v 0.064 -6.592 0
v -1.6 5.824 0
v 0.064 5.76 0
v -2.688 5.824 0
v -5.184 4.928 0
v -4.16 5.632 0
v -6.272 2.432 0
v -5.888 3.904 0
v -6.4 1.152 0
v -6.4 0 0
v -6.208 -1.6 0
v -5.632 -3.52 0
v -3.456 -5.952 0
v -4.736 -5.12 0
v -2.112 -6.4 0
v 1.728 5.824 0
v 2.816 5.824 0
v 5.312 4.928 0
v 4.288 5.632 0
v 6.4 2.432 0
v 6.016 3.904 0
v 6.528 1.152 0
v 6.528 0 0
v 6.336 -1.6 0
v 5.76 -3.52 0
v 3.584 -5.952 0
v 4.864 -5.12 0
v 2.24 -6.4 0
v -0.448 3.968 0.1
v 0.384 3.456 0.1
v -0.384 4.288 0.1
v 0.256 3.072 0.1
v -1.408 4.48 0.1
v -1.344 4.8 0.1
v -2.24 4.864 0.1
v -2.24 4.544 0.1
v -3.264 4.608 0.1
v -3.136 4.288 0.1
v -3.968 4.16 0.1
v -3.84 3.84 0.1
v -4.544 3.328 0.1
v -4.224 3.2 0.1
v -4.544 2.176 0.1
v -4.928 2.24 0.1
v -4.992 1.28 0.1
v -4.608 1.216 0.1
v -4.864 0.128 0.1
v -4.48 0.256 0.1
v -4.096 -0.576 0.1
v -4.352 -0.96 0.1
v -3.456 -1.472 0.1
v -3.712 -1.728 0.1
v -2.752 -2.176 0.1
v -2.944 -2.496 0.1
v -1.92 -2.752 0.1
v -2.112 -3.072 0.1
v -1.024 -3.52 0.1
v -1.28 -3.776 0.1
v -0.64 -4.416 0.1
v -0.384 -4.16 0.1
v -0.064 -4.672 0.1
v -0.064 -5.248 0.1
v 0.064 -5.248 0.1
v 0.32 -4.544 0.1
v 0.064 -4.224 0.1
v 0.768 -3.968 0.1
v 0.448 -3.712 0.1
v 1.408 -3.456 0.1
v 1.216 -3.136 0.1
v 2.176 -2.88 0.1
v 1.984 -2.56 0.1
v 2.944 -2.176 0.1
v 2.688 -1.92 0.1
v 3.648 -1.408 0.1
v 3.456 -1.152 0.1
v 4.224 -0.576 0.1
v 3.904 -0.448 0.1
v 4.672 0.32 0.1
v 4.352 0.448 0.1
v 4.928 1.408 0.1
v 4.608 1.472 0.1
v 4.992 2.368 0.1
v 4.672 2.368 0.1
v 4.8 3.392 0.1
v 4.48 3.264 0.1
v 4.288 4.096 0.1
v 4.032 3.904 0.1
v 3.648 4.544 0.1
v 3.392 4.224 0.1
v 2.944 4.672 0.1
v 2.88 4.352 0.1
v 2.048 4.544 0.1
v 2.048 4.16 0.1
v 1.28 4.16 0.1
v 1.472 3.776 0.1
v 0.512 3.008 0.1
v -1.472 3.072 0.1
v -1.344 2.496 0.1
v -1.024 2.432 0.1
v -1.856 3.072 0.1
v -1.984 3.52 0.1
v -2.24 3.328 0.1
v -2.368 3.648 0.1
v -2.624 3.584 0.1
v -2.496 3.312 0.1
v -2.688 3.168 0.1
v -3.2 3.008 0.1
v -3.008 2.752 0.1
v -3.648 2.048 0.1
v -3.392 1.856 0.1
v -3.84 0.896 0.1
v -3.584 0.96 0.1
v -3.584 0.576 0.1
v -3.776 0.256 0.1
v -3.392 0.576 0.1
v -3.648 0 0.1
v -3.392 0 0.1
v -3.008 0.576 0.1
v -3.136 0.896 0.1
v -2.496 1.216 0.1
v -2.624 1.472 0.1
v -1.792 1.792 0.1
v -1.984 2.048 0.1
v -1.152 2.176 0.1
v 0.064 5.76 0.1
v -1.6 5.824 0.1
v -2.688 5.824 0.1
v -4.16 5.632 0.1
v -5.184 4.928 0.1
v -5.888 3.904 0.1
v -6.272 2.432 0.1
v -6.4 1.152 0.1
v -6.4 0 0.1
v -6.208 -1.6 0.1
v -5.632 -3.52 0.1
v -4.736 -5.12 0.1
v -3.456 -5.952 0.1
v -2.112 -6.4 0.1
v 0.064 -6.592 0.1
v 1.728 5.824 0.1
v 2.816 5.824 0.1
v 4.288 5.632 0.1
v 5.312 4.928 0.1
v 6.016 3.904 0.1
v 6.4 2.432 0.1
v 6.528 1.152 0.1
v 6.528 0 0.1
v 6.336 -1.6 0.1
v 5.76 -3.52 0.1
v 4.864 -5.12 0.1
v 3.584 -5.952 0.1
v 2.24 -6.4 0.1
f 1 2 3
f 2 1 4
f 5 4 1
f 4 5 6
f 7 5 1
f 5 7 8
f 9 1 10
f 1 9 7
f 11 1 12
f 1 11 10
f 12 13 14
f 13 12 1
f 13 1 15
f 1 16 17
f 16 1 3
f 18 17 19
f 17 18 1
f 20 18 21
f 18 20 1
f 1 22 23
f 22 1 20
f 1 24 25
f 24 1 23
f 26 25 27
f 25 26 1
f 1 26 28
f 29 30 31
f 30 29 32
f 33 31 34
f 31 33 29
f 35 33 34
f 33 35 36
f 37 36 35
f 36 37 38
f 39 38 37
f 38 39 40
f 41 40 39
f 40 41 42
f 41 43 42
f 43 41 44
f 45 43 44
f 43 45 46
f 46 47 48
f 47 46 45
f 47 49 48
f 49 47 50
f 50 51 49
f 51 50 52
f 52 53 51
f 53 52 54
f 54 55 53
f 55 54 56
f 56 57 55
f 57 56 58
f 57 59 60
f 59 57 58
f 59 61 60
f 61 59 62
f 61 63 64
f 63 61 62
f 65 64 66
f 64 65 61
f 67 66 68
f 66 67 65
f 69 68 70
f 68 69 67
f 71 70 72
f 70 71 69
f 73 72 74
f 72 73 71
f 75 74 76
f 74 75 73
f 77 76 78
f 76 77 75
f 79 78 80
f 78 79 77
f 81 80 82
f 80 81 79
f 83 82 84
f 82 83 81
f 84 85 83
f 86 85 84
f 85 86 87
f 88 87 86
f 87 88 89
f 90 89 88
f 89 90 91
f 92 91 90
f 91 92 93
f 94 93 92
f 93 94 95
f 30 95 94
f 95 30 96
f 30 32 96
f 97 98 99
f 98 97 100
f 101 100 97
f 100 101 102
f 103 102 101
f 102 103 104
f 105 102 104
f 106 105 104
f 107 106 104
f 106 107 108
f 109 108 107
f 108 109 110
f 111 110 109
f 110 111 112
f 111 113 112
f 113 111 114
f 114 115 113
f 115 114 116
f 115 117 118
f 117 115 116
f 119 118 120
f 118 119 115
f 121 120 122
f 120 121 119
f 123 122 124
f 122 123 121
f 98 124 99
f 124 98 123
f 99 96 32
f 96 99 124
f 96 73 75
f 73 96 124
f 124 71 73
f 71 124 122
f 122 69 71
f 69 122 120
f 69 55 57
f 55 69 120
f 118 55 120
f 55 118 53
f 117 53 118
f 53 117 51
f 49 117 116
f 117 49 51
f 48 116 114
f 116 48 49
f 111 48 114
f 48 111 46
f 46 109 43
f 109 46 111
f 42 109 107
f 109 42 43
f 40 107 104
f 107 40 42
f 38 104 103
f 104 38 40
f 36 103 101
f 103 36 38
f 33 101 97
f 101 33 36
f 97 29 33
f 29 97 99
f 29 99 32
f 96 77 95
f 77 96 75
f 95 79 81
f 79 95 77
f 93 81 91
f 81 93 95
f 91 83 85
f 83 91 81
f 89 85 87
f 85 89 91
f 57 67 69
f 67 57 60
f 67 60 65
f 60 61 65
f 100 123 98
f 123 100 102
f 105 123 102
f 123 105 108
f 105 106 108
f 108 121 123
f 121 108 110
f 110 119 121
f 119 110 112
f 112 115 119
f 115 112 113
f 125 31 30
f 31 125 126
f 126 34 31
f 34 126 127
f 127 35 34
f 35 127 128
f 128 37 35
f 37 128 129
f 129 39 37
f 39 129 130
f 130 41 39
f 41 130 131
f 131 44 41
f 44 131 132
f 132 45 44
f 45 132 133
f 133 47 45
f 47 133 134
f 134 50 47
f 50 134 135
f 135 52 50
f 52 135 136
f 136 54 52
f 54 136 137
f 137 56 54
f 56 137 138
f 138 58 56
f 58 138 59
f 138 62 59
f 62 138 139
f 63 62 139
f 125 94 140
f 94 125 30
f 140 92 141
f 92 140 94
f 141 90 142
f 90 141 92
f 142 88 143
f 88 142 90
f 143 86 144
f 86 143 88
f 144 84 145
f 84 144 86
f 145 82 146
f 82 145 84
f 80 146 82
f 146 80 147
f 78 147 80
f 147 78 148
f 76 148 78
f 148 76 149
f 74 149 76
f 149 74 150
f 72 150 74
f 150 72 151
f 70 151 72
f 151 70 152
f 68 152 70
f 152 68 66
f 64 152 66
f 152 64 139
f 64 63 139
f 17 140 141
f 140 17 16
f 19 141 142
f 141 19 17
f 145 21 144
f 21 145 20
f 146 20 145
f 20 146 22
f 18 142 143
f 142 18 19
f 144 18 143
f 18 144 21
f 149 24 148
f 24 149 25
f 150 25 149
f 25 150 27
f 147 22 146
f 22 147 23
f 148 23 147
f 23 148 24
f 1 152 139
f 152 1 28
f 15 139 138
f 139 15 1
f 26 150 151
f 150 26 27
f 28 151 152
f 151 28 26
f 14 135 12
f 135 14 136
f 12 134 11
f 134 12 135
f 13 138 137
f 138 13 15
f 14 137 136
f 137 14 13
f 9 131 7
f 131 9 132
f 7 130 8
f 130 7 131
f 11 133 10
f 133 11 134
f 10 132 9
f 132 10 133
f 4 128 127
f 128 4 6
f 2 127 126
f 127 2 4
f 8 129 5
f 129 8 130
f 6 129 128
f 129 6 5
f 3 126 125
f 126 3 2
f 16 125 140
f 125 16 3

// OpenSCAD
use <../lib.scad>
function ldraw_lib__194065e() = [
// 0 Sticker  2 x  1.9 with Red Heart
// 0 Name: 194065e.dat
// 0 Author: Philippe Hurbain [Philo]
// 0 !LDRAW_ORG Part UPDATE 2018-01
// 0 !LICENSE Licensed under CC BY 2.0 and CC BY 4.0 : see CAreadme.txt
// 
// 0 BFC CERTIFY CCW
  [0,"BFC","CERTIFY"],
  [0,"BFC","CCW"],
// 
// 0 !KEYWORDS Fabuland, Set 3678
// 
// 0 !HISTORY 2018-01-30 [PTadmin] Official Update 2018-01
// 
// 
// 4 16 -4 0 14.56 .16 0 14.4 .16 0 -16.48 -6.72 0 14.56
  [4,16,-4,0,14.56,.16,0,14.4,.16,0,-16.48,-6.72,0,14.56],
// 4 16 -10.4 0 14.08 -6.72 0 14.56 .16 0 -16.48 -12.96 0 12.32
  [4,16,-10.4,0,14.08,-6.72,0,14.56,.16,0,-16.48,-12.96,0,12.32],
// 4 16 -14.72 0 9.76 -12.96 0 12.32 .16 0 -16.48 -15.68 0 6.08
  [4,16,-14.72,0,9.76,-12.96,0,12.32,.16,0,-16.48,-15.68,0,6.08],
// 4 16 -16 0 2.88 -15.68 0 6.08 .16 0 -16.48 -16 0 0
  [4,16,-16,0,2.88,-15.68,0,6.08,.16,0,-16.48,-16,0,0],
// 4 16 -15.52 0 -4 -16 0 0 .16 0 -16.48 -14.08 0 -8.8
  [4,16,-15.52,0,-4,-16,0,0,.16,0,-16.48,-14.08,0,-8.8],
// 4 16 -11.84 0 -12.8 -14.08 0 -8.8 .16 0 -16.48 -8.64 0 -14.88
  [4,16,-11.84,0,-12.8,-14.08,0,-8.8,.16,0,-16.48,-8.64,0,-14.88],
// 3 16 -8.64 0 -14.88 .16 0 -16.48 -5.28 0 -16
  [3,16,-8.64,0,-14.88,.16,0,-16.48,-5.28,0,-16],
// 4 16 .16 0 -16.48 .16 0 14.4 4.32 0 14.56 7.04 0 14.56
  [4,16,.16,0,-16.48,.16,0,14.4,4.32,0,14.56,7.04,0,14.56],
// 4 16 .16 0 -16.48 7.04 0 14.56 10.72 0 14.08 13.28 0 12.32
  [4,16,.16,0,-16.48,7.04,0,14.56,10.72,0,14.08,13.28,0,12.32],
// 4 16 .16 0 -16.48 13.28 0 12.32 15.04 0 9.76 16 0 6.08
  [4,16,.16,0,-16.48,13.28,0,12.32,15.04,0,9.76,16,0,6.08],
// 4 16 .16 0 -16.48 16 0 6.08 16.32 0 2.88 16.32 0 0
  [4,16,.16,0,-16.48,16,0,6.08,16.32,0,2.88,16.32,0,0],
// 4 16 .16 0 -16.48 16.32 0 0 15.84 0 -4 14.4 0 -8.8
  [4,16,.16,0,-16.48,16.32,0,0,15.84,0,-4,14.4,0,-8.8],
// 4 16 .16 0 -16.48 14.4 0 -8.8 12.16 0 -12.8 8.96 0 -14.88
  [4,16,.16,0,-16.48,14.4,0,-8.8,12.16,0,-12.8,8.96,0,-14.88],
// 3 16 .16 0 -16.48 8.96 0 -14.88 5.6 0 -16
  [3,16,.16,0,-16.48,8.96,0,-14.88,5.6,0,-16],
// 4 0 -1.12 -.25 9.92 .64 -.25 7.68 .96 -.25 8.64 -.96 -.25 10.72
  [4,0,-1.12,-.25,9.92,.64,-.25,7.68,.96,-.25,8.64,-.96,-.25,10.72],
// 4 0 -1.12 -.25 9.92 -.96 -.25 10.72 -3.36 -.25 12 -3.52 -.25 11.2
  [4,0,-1.12,-.25,9.92,-.96,-.25,10.72,-3.36,-.25,12,-3.52,-.25,11.2],
// 4 0 -3.52 -.25 11.2 -3.36 -.25 12 -5.6 -.25 12.16 -5.6 -.25 11.36
  [4,0,-3.52,-.25,11.2,-3.36,-.25,12,-5.6,-.25,12.16,-5.6,-.25,11.36],
// 4 0 -8.16 -.25 11.52 -7.84 -.25 10.72 -5.6 -.25 11.36 -5.6 -.25 12.16
  [4,0,-8.16,-.25,11.52,-7.84,-.25,10.72,-5.6,-.25,11.36,-5.6,-.25,12.16],
// 4 0 -9.6 -.25 9.6 -7.84 -.25 10.72 -8.16 -.25 11.52 -9.92 -.25 10.4
  [4,0,-9.6,-.25,9.6,-7.84,-.25,10.72,-8.16,-.25,11.52,-9.92,-.25,10.4],
// 4 0 -9.6 -.25 9.6 -9.92 -.25 10.4 -11.36 -.25 8.32 -10.56 -.25 8
  [4,0,-9.6,-.25,9.6,-9.92,-.25,10.4,-11.36,-.25,8.32,-10.56,-.25,8],
// 4 0 -11.36 -.25 8.32 -12.32 -.25 5.6 -11.36 -.25 5.44 -10.56 -.25 8
  [4,0,-11.36,-.25,8.32,-12.32,-.25,5.6,-11.36,-.25,5.44,-10.56,-.25,8],
// 4 0 -11.52 -.25 3.04 -11.36 -.25 5.44 -12.32 -.25 5.6 -12.48 -.25 3.2
  [4,0,-11.52,-.25,3.04,-11.36,-.25,5.44,-12.32,-.25,5.6,-12.48,-.25,3.2],
// 4 0 -11.52 -.25 3.04 -12.48 -.25 3.2 -12.16 -.25 .32 -11.2 -.25 .64
  [4,0,-11.52,-.25,3.04,-12.48,-.25,3.2,-12.16,-.25,.32,-11.2,-.25,.64],
// 4 0 -11.2 -.25 .64 -12.16 -.25 .32 -10.88 -.25 -2.4 -10.24 -.25 -1.44
  [4,0,-11.2,-.25,.64,-12.16,-.25,.32,-10.88,-.25,-2.4,-10.24,-.25,-1.44],
// 4 0 -10.24 -.25 -1.44 -10.88 -.25 -2.4 -9.28 -.25 -4.32 -8.64 -.25 -3.68
  [4,0,-10.24,-.25,-1.44,-10.88,-.25,-2.4,-9.28,-.25,-4.32,-8.64,-.25,-3.68],
// 4 0 -8.64 -.25 -3.68 -9.28 -.25 -4.32 -7.36 -.25 -6.24 -6.88 -.25 -5.44
  [4,0,-8.64,-.25,-3.68,-9.28,-.25,-4.32,-7.36,-.25,-6.24,-6.88,-.25,-5.44],
// 4 0 -6.88 -.25 -5.44 -7.36 -.25 -6.24 -5.28 -.25 -7.68 -4.8 -.25 -6.88
  [4,0,-6.88,-.25,-5.44,-7.36,-.25,-6.24,-5.28,-.25,-7.68,-4.8,-.25,-6.88],
// 4 0 -4.8 -.25 -6.88 -5.28 -.25 -7.68 -3.2 -.25 -9.44 -2.56 -.25 -8.8
  [4,0,-4.8,-.25,-6.88,-5.28,-.25,-7.68,-3.2,-.25,-9.44,-2.56,-.25,-8.8],
// 4 0 -2.56 -.25 -8.8 -3.2 -.25 -9.44 -1.6 -.25 -11.04 -.96 -.25 -10.4
  [4,0,-2.56,-.25,-8.8,-3.2,-.25,-9.44,-1.6,-.25,-11.04,-.96,-.25,-10.4],
// 4 0 -.96 -.25 -10.4 -1.6 -.25 -11.04 -.16 -.25 -13.12 -.16 -.25 -11.68
  [4,0,-.96,-.25,-10.4,-1.6,-.25,-11.04,-.16,-.25,-13.12,-.16,-.25,-11.68],
// 4 0 -.16 -.25 -11.68 -.16 -.25 -13.12 .16 -.25 -13.12 .8 -.25 -11.36
  [4,0,-.16,-.25,-11.68,-.16,-.25,-13.12,.16,-.25,-13.12,.8,-.25,-11.36],
// 4 0 .16 -.25 -10.56 -.16 -.25 -11.68 .8 -.25 -11.36 1.92 -.25 -9.92
  [4,0,.16,-.25,-10.56,-.16,-.25,-11.68,.8,-.25,-11.36,1.92,-.25,-9.92],
// 4 0 1.12 -.25 -9.28 .16 -.25 -10.56 1.92 -.25 -9.92 3.52 -.25 -8.64
  [4,0,1.12,-.25,-9.28,.16,-.25,-10.56,1.92,-.25,-9.92,3.52,-.25,-8.64],
// 4 0 3.04 -.25 -7.84 1.12 -.25 -9.28 3.52 -.25 -8.64 5.44 -.25 -7.2
  [4,0,3.04,-.25,-7.84,1.12,-.25,-9.28,3.52,-.25,-8.64,5.44,-.25,-7.2],
// 4 0 4.96 -.25 -6.4 3.04 -.25 -7.84 5.44 -.25 -7.2 7.36 -.25 -5.44
  [4,0,4.96,-.25,-6.4,3.04,-.25,-7.84,5.44,-.25,-7.2,7.36,-.25,-5.44],
// 4 0 6.72 -.25 -4.8 4.96 -.25 -6.4 7.36 -.25 -5.44 9.12 -.25 -3.52
  [4,0,6.72,-.25,-4.8,4.96,-.25,-6.4,7.36,-.25,-5.44,9.12,-.25,-3.52],
// 4 0 8.64 -.25 -2.88 6.72 -.25 -4.8 9.12 -.25 -3.52 10.56 -.25 -1.44
  [4,0,8.64,-.25,-2.88,6.72,-.25,-4.8,9.12,-.25,-3.52,10.56,-.25,-1.44],
// 4 0 9.76 -.25 -1.12 8.64 -.25 -2.88 10.56 -.25 -1.44 11.68 -.25 .8
  [4,0,9.76,-.25,-1.12,8.64,-.25,-2.88,10.56,-.25,-1.44,11.68,-.25,.8],
// 4 0 10.88 -.25 1.12 9.76 -.25 -1.12 11.68 -.25 .8 12.32 -.25 3.52
  [4,0,10.88,-.25,1.12,9.76,-.25,-1.12,11.68,-.25,.8,12.32,-.25,3.52],
// 4 0 11.52 -.25 3.68 10.88 -.25 1.12 12.32 -.25 3.52 12.48 -.25 5.92
  [4,0,11.52,-.25,3.68,10.88,-.25,1.12,12.32,-.25,3.52,12.48,-.25,5.92],
// 4 0 11.68 -.25 5.92 11.52 -.25 3.68 12.48 -.25 5.92 12 -.25 8.48
  [4,0,11.68,-.25,5.92,11.52,-.25,3.68,12.48,-.25,5.92,12,-.25,8.48],
// 3 0 12 -.25 8.48 11.2 -.25 8.16 11.68 -.25 5.92
  [3,0,12,-.25,8.48,11.2,-.25,8.16,11.68,-.25,5.92],
// 4 0 11.2 -.25 8.16 12 -.25 8.48 10.72 -.25 10.24 10.08 -.25 9.76
  [4,0,11.2,-.25,8.16,12,-.25,8.48,10.72,-.25,10.24,10.08,-.25,9.76],
// 4 0 10.08 -.25 9.76 10.72 -.25 10.24 9.12 -.25 11.36 8.48 -.25 10.56
  [4,0,10.08,-.25,9.76,10.72,-.25,10.24,9.12,-.25,11.36,8.48,-.25,10.56],
// 4 0 8.48 -.25 10.56 9.12 -.25 11.36 7.36 -.25 11.68 7.2 -.25 10.88
  [4,0,8.48,-.25,10.56,9.12,-.25,11.36,7.36,-.25,11.68,7.2,-.25,10.88],
// 4 0 7.2 -.25 10.88 7.36 -.25 11.68 5.12 -.25 11.36 5.12 -.25 10.4
  [4,0,7.2,-.25,10.88,7.36,-.25,11.68,5.12,-.25,11.36,5.12,-.25,10.4],
// 4 0 5.12 -.25 10.4 5.12 -.25 11.36 3.2 -.25 10.4 3.68 -.25 9.44
  [4,0,5.12,-.25,10.4,5.12,-.25,11.36,3.2,-.25,10.4,3.68,-.25,9.44],
// 4 0 3.68 -.25 9.44 3.2 -.25 10.4 .96 -.25 8.64 1.28 -.25 7.52
  [4,0,3.68,-.25,9.44,3.2,-.25,10.4,.96,-.25,8.64,1.28,-.25,7.52],
// 3 0 .96 -.25 8.64 .64 -.25 7.68 1.28 -.25 7.52
  [3,0,.96,-.25,8.64,.64,-.25,7.68,1.28,-.25,7.52],
// 4 0 -3.36 -.25 6.24 -2.56 -.25 6.08 -3.68 -.25 7.68 -4.64 -.25 7.68
  [4,0,-3.36,-.25,6.24,-2.56,-.25,6.08,-3.68,-.25,7.68,-4.64,-.25,7.68],
// 4 0 -4.64 -.25 7.68 -3.68 -.25 7.68 -4.96 -.25 8.8 -5.6 -.25 8.32
  [4,0,-4.64,-.25,7.68,-3.68,-.25,7.68,-4.96,-.25,8.8,-5.6,-.25,8.32],
// 4 0 -5.6 -.25 8.32 -4.96 -.25 8.8 -5.92 -.25 9.12 -6.56 -.25 8.96
  [4,0,-5.6,-.25,8.32,-4.96,-.25,8.8,-5.92,-.25,9.12,-6.56,-.25,8.96],
// 3 0 -6.24 -.25 8.28 -5.6 -.25 8.32 -6.56 -.25 8.96
  [3,0,-6.24,-.25,8.28,-5.6,-.25,8.32,-6.56,-.25,8.96],
// 3 0 -6.72 -.25 7.92 -6.24 -.25 8.28 -6.56 -.25 8.96
  [3,0,-6.72,-.25,7.92,-6.24,-.25,8.28,-6.56,-.25,8.96],
// 4 0 -6.72 -.25 7.92 -6.56 -.25 8.96 -8 -.25 7.52 -7.52 -.25 6.88
  [4,0,-6.72,-.25,7.92,-6.56,-.25,8.96,-8,-.25,7.52,-7.52,-.25,6.88],
// 4 0 -7.52 -.25 6.88 -8 -.25 7.52 -9.12 -.25 5.12 -8.48 -.25 4.64
  [4,0,-7.52,-.25,6.88,-8,-.25,7.52,-9.12,-.25,5.12,-8.48,-.25,4.64],
// 4 0 -8.48 -.25 4.64 -9.12 -.25 5.12 -9.6 -.25 2.24 -8.96 -.25 2.4
  [4,0,-8.48,-.25,4.64,-9.12,-.25,5.12,-9.6,-.25,2.24,-8.96,-.25,2.4],
// 4 0 -8.96 -.25 2.4 -9.6 -.25 2.24 -9.44 -.25 .64 -8.96 -.25 1.44
  [4,0,-8.96,-.25,2.4,-9.6,-.25,2.24,-9.44,-.25,.64,-8.96,-.25,1.44],
// 4 0 -8.96 -.25 1.44 -9.44 -.25 .64 -9.12 -.25 0 -8.48 -.25 1.44
  [4,0,-8.96,-.25,1.44,-9.44,-.25,.64,-9.12,-.25,0,-8.48,-.25,1.44],
// 4 0 -8.48 -.25 1.44 -9.12 -.25 0 -8.48 -.25 0 -7.52 -.25 1.44
  [4,0,-8.48,-.25,1.44,-9.12,-.25,0,-8.48,-.25,0,-7.52,-.25,1.44],
// 4 0 -7.84 -.25 2.24 -8.48 -.25 1.44 -7.52 -.25 1.44 -6.24 -.25 3.04
  [4,0,-7.84,-.25,2.24,-8.48,-.25,1.44,-7.52,-.25,1.44,-6.24,-.25,3.04],
// 4 0 -6.56 -.25 3.68 -7.84 -.25 2.24 -6.24 -.25 3.04 -4.48 -.25 4.48
  [4,0,-6.56,-.25,3.68,-7.84,-.25,2.24,-6.24,-.25,3.04,-4.48,-.25,4.48],
// 4 0 -4.96 -.25 5.12 -6.56 -.25 3.68 -4.48 -.25 4.48 -2.88 -.25 5.44
  [4,0,-4.96,-.25,5.12,-6.56,-.25,3.68,-4.48,-.25,4.48,-2.88,-.25,5.44],
// 4 0 -3.36 -.25 6.24 -4.96 -.25 5.12 -2.88 -.25 5.44 -2.56 -.25 6.08
  [4,0,-3.36,-.25,6.24,-4.96,-.25,5.12,-2.88,-.25,5.44,-2.56,-.25,6.08],
// 4 4 .64 -.25 7.68 -2.56 -.25 6.08 -2.88 -.25 5.44 1.28 -.25 7.52
  [4,4,.64,-.25,7.68,-2.56,-.25,6.08,-2.88,-.25,5.44,1.28,-.25,7.52],
// 4 4 8.64 -.25 -2.88 1.28 -.25 7.52 -2.88 -.25 5.44 6.72 -.25 -4.8
  [4,4,8.64,-.25,-2.88,1.28,-.25,7.52,-2.88,-.25,5.44,6.72,-.25,-4.8],
// 4 4 4.96 -.25 -6.4 6.72 -.25 -4.8 -2.88 -.25 5.44 -4.48 -.25 4.48
  [4,4,4.96,-.25,-6.4,6.72,-.25,-4.8,-2.88,-.25,5.44,-4.48,-.25,4.48],
// 4 4 4.96 -.25 -6.4 -4.48 -.25 4.48 -6.24 -.25 3.04 3.04 -.25 -7.84
  [4,4,4.96,-.25,-6.4,-4.48,-.25,4.48,-6.24,-.25,3.04,3.04,-.25,-7.84],
// 4 4 -2.56 -.25 -8.8 3.04 -.25 -7.84 -6.24 -.25 3.04 -4.8 -.25 -6.88
  [4,4,-2.56,-.25,-8.8,3.04,-.25,-7.84,-6.24,-.25,3.04,-4.8,-.25,-6.88],
// 4 4 -6.88 -.25 -5.44 -4.8 -.25 -6.88 -6.24 -.25 3.04 -7.52 -.25 1.44
  [4,4,-6.88,-.25,-5.44,-4.8,-.25,-6.88,-6.24,-.25,3.04,-7.52,-.25,1.44],
// 4 4 -6.88 -.25 -5.44 -7.52 -.25 1.44 -8.48 -.25 0 -8.64 -.25 -3.68
  [4,4,-6.88,-.25,-5.44,-7.52,-.25,1.44,-8.48,-.25,0,-8.64,-.25,-3.68],
// 4 4 -8.64 -.25 -3.68 -8.48 -.25 0 -9.12 -.25 0 -10.24 -.25 -1.44
  [4,4,-8.64,-.25,-3.68,-8.48,-.25,0,-9.12,-.25,0,-10.24,-.25,-1.44],
// 4 4 -10.24 -.25 -1.44 -9.12 -.25 0 -9.44 -.25 .64 -11.2 -.25 .64
  [4,4,-10.24,-.25,-1.44,-9.12,-.25,0,-9.44,-.25,.64,-11.2,-.25,.64],
// 4 4 -11.2 -.25 .64 -9.44 -.25 .64 -9.6 -.25 2.24 -11.52 -.25 3.04
  [4,4,-11.2,-.25,.64,-9.44,-.25,.64,-9.6,-.25,2.24,-11.52,-.25,3.04],
// 4 4 -11.52 -.25 3.04 -9.6 -.25 2.24 -9.12 -.25 5.12 -11.36 -.25 5.44
  [4,4,-11.52,-.25,3.04,-9.6,-.25,2.24,-9.12,-.25,5.12,-11.36,-.25,5.44],
// 4 4 -11.36 -.25 5.44 -9.12 -.25 5.12 -8 -.25 7.52 -10.56 -.25 8
  [4,4,-11.36,-.25,5.44,-9.12,-.25,5.12,-8,-.25,7.52,-10.56,-.25,8],
// 4 4 -9.6 -.25 9.6 -10.56 -.25 8 -8 -.25 7.52 -6.56 -.25 8.96
  [4,4,-9.6,-.25,9.6,-10.56,-.25,8,-8,-.25,7.52,-6.56,-.25,8.96],
// 4 4 -7.84 -.25 10.72 -9.6 -.25 9.6 -6.56 -.25 8.96 -5.92 -.25 9.12
  [4,4,-7.84,-.25,10.72,-9.6,-.25,9.6,-6.56,-.25,8.96,-5.92,-.25,9.12],
// 4 4 -5.6 -.25 11.36 -7.84 -.25 10.72 -5.92 -.25 9.12 -4.96 -.25 8.8
  [4,4,-5.6,-.25,11.36,-7.84,-.25,10.72,-5.92,-.25,9.12,-4.96,-.25,8.8],
// 4 4 -3.52 -.25 11.2 -5.6 -.25 11.36 -4.96 -.25 8.8 -3.68 -.25 7.68
  [4,4,-3.52,-.25,11.2,-5.6,-.25,11.36,-4.96,-.25,8.8,-3.68,-.25,7.68],
// 4 4 -1.12 -.25 9.92 -3.52 -.25 11.2 -3.68 -.25 7.68 -2.56 -.25 6.08
  [4,4,-1.12,-.25,9.92,-3.52,-.25,11.2,-3.68,-.25,7.68,-2.56,-.25,6.08],
// 3 4 -1.12 -.25 9.92 -2.56 -.25 6.08 .64 -.25 7.68
  [3,4,-1.12,-.25,9.92,-2.56,-.25,6.08,.64,-.25,7.68],
// 4 4 1.28 -.25 7.52 8.64 -.25 -2.88 9.76 -.25 -1.12 3.68 -.25 9.44
  [4,4,1.28,-.25,7.52,8.64,-.25,-2.88,9.76,-.25,-1.12,3.68,-.25,9.44],
// 4 4 3.68 -.25 9.44 9.76 -.25 -1.12 10.88 -.25 1.12 11.52 -.25 3.68
  [4,4,3.68,-.25,9.44,9.76,-.25,-1.12,10.88,-.25,1.12,11.52,-.25,3.68],
// 4 4 5.12 -.25 10.4 3.68 -.25 9.44 11.52 -.25 3.68 7.2 -.25 10.88
  [4,4,5.12,-.25,10.4,3.68,-.25,9.44,11.52,-.25,3.68,7.2,-.25,10.88],
// 4 4 7.2 -.25 10.88 11.52 -.25 3.68 11.68 -.25 5.92 11.2 -.25 8.16
  [4,4,7.2,-.25,10.88,11.52,-.25,3.68,11.68,-.25,5.92,11.2,-.25,8.16],
// 4 4 8.48 -.25 10.56 7.2 -.25 10.88 11.2 -.25 8.16 10.08 -.25 9.76
  [4,4,8.48,-.25,10.56,7.2,-.25,10.88,11.2,-.25,8.16,10.08,-.25,9.76],
// 4 4 1.12 -.25 -9.28 3.04 -.25 -7.84 -2.56 -.25 -8.8 -.96 -.25 -10.4
  [4,4,1.12,-.25,-9.28,3.04,-.25,-7.84,-2.56,-.25,-8.8,-.96,-.25,-10.4],
// 3 4 1.12 -.25 -9.28 -.96 -.25 -10.4 .16 -.25 -10.56
  [3,4,1.12,-.25,-9.28,-.96,-.25,-10.4,.16,-.25,-10.56],
// 3 4 -.96 -.25 -10.4 -.16 -.25 -11.68 .16 -.25 -10.56
  [3,4,-.96,-.25,-10.4,-.16,-.25,-11.68,.16,-.25,-10.56],
// 4 15 -4.96 -.25 5.12 -3.36 -.25 6.24 -4.64 -.25 7.68 -5.6 -.25 8.32
  [4,15,-4.96,-.25,5.12,-3.36,-.25,6.24,-4.64,-.25,7.68,-5.6,-.25,8.32],
// 4 15 -5.6 -.25 8.32 -6.24 -.25 8.28 -7.52 -.25 6.88 -4.96 -.25 5.12
  [4,15,-5.6,-.25,8.32,-6.24,-.25,8.28,-7.52,-.25,6.88,-4.96,-.25,5.12],
// 3 15 -6.24 -.25 8.28 -6.72 -.25 7.92 -7.52 -.25 6.88
  [3,15,-6.24,-.25,8.28,-6.72,-.25,7.92,-7.52,-.25,6.88],
// 4 15 -6.56 -.25 3.68 -4.96 -.25 5.12 -7.52 -.25 6.88 -8.48 -.25 4.64
  [4,15,-6.56,-.25,3.68,-4.96,-.25,5.12,-7.52,-.25,6.88,-8.48,-.25,4.64],
// 4 15 -7.84 -.25 2.24 -6.56 -.25 3.68 -8.48 -.25 4.64 -8.96 -.25 2.4
  [4,15,-7.84,-.25,2.24,-6.56,-.25,3.68,-8.48,-.25,4.64,-8.96,-.25,2.4],
// 4 15 -8.48 -.25 1.44 -7.84 -.25 2.24 -8.96 -.25 2.4 -8.96 -.25 1.44
  [4,15,-8.48,-.25,1.44,-7.84,-.25,2.24,-8.96,-.25,2.4,-8.96,-.25,1.44],
// 4 16 -.96 -.25 10.72 .96 -.25 8.64 .16 -.25 14.4 -4 -.25 14.56
  [4,16,-.96,-.25,10.72,.96,-.25,8.64,.16,-.25,14.4,-4,-.25,14.56],
// 4 16 -3.36 -.25 12 -.96 -.25 10.72 -4 -.25 14.56 -6.72 -.25 14.56
  [4,16,-3.36,-.25,12,-.96,-.25,10.72,-4,-.25,14.56,-6.72,-.25,14.56],
// 4 16 -5.6 -.25 12.16 -3.36 -.25 12 -6.72 -.25 14.56 -10.4 -.25 14.08
  [4,16,-5.6,-.25,12.16,-3.36,-.25,12,-6.72,-.25,14.56,-10.4,-.25,14.08],
// 4 16 -8.16 -.25 11.52 -5.6 -.25 12.16 -10.4 -.25 14.08 -12.96 -.25 12.32
  [4,16,-8.16,-.25,11.52,-5.6,-.25,12.16,-10.4,-.25,14.08,-12.96,-.25,12.32],
// 4 16 -9.92 -.25 10.4 -8.16 -.25 11.52 -12.96 -.25 12.32 -14.72 -.25 9.76
  [4,16,-9.92,-.25,10.4,-8.16,-.25,11.52,-12.96,-.25,12.32,-14.72,-.25,9.76],
// 4 16 -11.36 -.25 8.32 -9.92 -.25 10.4 -14.72 -.25 9.76 -15.68 -.25 6.08
  [4,16,-11.36,-.25,8.32,-9.92,-.25,10.4,-14.72,-.25,9.76,-15.68,-.25,6.08],
// 4 16 -12.32 -.25 5.6 -11.36 -.25 8.32 -15.68 -.25 6.08 -16 -.25 2.88
  [4,16,-12.32,-.25,5.6,-11.36,-.25,8.32,-15.68,-.25,6.08,-16,-.25,2.88],
// 4 16 -12.48 -.25 3.2 -12.32 -.25 5.6 -16 -.25 2.88 -16 -.25 0
  [4,16,-12.48,-.25,3.2,-12.32,-.25,5.6,-16,-.25,2.88,-16,-.25,0],
// 4 16 -12.16 -.25 .32 -12.48 -.25 3.2 -16 -.25 0 -15.52 -.25 -4
  [4,16,-12.16,-.25,.32,-12.48,-.25,3.2,-16,-.25,0,-15.52,-.25,-4],
// 4 16 -10.88 -.25 -2.4 -12.16 -.25 .32 -15.52 -.25 -4 -14.08 -.25 -8.8
  [4,16,-10.88,-.25,-2.4,-12.16,-.25,.32,-15.52,-.25,-4,-14.08,-.25,-8.8],
// 4 16 -9.28 -.25 -4.32 -10.88 -.25 -2.4 -14.08 -.25 -8.8 -11.84 -.25 -12.8
  [4,16,-9.28,-.25,-4.32,-10.88,-.25,-2.4,-14.08,-.25,-8.8,-11.84,-.25,-12.8],
// 4 16 -7.36 -.25 -6.24 -9.28 -.25 -4.32 -11.84 -.25 -12.8 -8.64 -.25 -14.88
  [4,16,-7.36,-.25,-6.24,-9.28,-.25,-4.32,-11.84,-.25,-12.8,-8.64,-.25,-14.88],
// 4 16 -5.28 -.25 -7.68 -7.36 -.25 -6.24 -8.64 -.25 -14.88 -5.28 -.25 -16
  [4,16,-5.28,-.25,-7.68,-7.36,-.25,-6.24,-8.64,-.25,-14.88,-5.28,-.25,-16],
// 4 16 -3.2 -.25 -9.44 -5.28 -.25 -7.68 -5.28 -.25 -16 -1.6 -.25 -11.04
  [4,16,-3.2,-.25,-9.44,-5.28,-.25,-7.68,-5.28,-.25,-16,-1.6,-.25,-11.04],
// 4 16 -.16 -.25 -13.12 -1.6 -.25 -11.04 -5.28 -.25 -16 .16 -.25 -16.48
  [4,16,-.16,-.25,-13.12,-1.6,-.25,-11.04,-5.28,-.25,-16,.16,-.25,-16.48],
// 3 16 .16 -.25 -13.12 -.16 -.25 -13.12 .16 -.25 -16.48
  [3,16,.16,-.25,-13.12,-.16,-.25,-13.12,.16,-.25,-16.48],
// 4 16 .16 -.25 14.4 .96 -.25 8.64 3.2 -.25 10.4 4.32 -.25 14.56
  [4,16,.16,-.25,14.4,.96,-.25,8.64,3.2,-.25,10.4,4.32,-.25,14.56],
// 4 16 4.32 -.25 14.56 3.2 -.25 10.4 5.12 -.25 11.36 7.04 -.25 14.56
  [4,16,4.32,-.25,14.56,3.2,-.25,10.4,5.12,-.25,11.36,7.04,-.25,14.56],
// 4 16 7.04 -.25 14.56 5.12 -.25 11.36 7.36 -.25 11.68 10.72 -.25 14.08
  [4,16,7.04,-.25,14.56,5.12,-.25,11.36,7.36,-.25,11.68,10.72,-.25,14.08],
// 4 16 10.72 -.25 14.08 7.36 -.25 11.68 9.12 -.25 11.36 13.28 -.25 12.32
  [4,16,10.72,-.25,14.08,7.36,-.25,11.68,9.12,-.25,11.36,13.28,-.25,12.32],
// 4 16 13.28 -.25 12.32 9.12 -.25 11.36 10.72 -.25 10.24 15.04 -.25 9.76
  [4,16,13.28,-.25,12.32,9.12,-.25,11.36,10.72,-.25,10.24,15.04,-.25,9.76],
// 4 16 15.04 -.25 9.76 10.72 -.25 10.24 12 -.25 8.48 16 -.25 6.08
  [4,16,15.04,-.25,9.76,10.72,-.25,10.24,12,-.25,8.48,16,-.25,6.08],
// 4 16 16 -.25 6.08 12 -.25 8.48 12.48 -.25 5.92 16.32 -.25 2.88
  [4,16,16,-.25,6.08,12,-.25,8.48,12.48,-.25,5.92,16.32,-.25,2.88],
// 4 16 16.32 -.25 2.88 12.48 -.25 5.92 12.32 -.25 3.52 16.32 -.25 0
  [4,16,16.32,-.25,2.88,12.48,-.25,5.92,12.32,-.25,3.52,16.32,-.25,0],
// 4 16 16.32 -.25 0 12.32 -.25 3.52 11.68 -.25 .8 15.84 -.25 -4
  [4,16,16.32,-.25,0,12.32,-.25,3.52,11.68,-.25,.8,15.84,-.25,-4],
// 4 16 15.84 -.25 -4 11.68 -.25 .8 10.56 -.25 -1.44 14.4 -.25 -8.8
  [4,16,15.84,-.25,-4,11.68,-.25,.8,10.56,-.25,-1.44,14.4,-.25,-8.8],
// 4 16 14.4 -.25 -8.8 10.56 -.25 -1.44 9.12 -.25 -3.52 12.16 -.25 -12.8
  [4,16,14.4,-.25,-8.8,10.56,-.25,-1.44,9.12,-.25,-3.52,12.16,-.25,-12.8],
// 4 16 12.16 -.25 -12.8 9.12 -.25 -3.52 7.36 -.25 -5.44 8.96 -.25 -14.88
  [4,16,12.16,-.25,-12.8,9.12,-.25,-3.52,7.36,-.25,-5.44,8.96,-.25,-14.88],
// 4 16 8.96 -.25 -14.88 7.36 -.25 -5.44 5.44 -.25 -7.2 5.6 -.25 -16
  [4,16,8.96,-.25,-14.88,7.36,-.25,-5.44,5.44,-.25,-7.2,5.6,-.25,-16],
// 4 16 5.6 -.25 -16 5.44 -.25 -7.2 3.52 -.25 -8.64 1.92 -.25 -9.92
  [4,16,5.6,-.25,-16,5.44,-.25,-7.2,3.52,-.25,-8.64,1.92,-.25,-9.92],
// 4 16 5.6 -.25 -16 1.92 -.25 -9.92 .8 -.25 -11.36 .16 -.25 -16.48
  [4,16,5.6,-.25,-16,1.92,-.25,-9.92,.8,-.25,-11.36,.16,-.25,-16.48],
// 3 16 .8 -.25 -11.36 .16 -.25 -13.12 .16 -.25 -16.48
  [3,16,.8,-.25,-11.36,.16,-.25,-13.12,.16,-.25,-16.48],
// 4 16 7.04 -.25 14.56 7.04 0 14.56 4.32 0 14.56 4.32 -.25 14.56
  [4,16,7.04,-.25,14.56,7.04,0,14.56,4.32,0,14.56,4.32,-.25,14.56],
// 4 16 10.72 -.25 14.08 10.72 0 14.08 7.04 0 14.56 7.04 -.25 14.56
  [4,16,10.72,-.25,14.08,10.72,0,14.08,7.04,0,14.56,7.04,-.25,14.56],
// 4 16 16 -.25 6.08 16 0 6.08 15.04 0 9.76 15.04 -.25 9.76
  [4,16,16,-.25,6.08,16,0,6.08,15.04,0,9.76,15.04,-.25,9.76],
// 4 16 16.32 -.25 2.88 16.32 0 2.88 16 0 6.08 16 -.25 6.08
  [4,16,16.32,-.25,2.88,16.32,0,2.88,16,0,6.08,16,-.25,6.08],
// 4 16 13.28 -.25 12.32 13.28 0 12.32 10.72 0 14.08 10.72 -.25 14.08
  [4,16,13.28,-.25,12.32,13.28,0,12.32,10.72,0,14.08,10.72,-.25,14.08],
// 4 16 15.04 -.25 9.76 15.04 0 9.76 13.28 0 12.32 13.28 -.25 12.32
  [4,16,15.04,-.25,9.76,15.04,0,9.76,13.28,0,12.32,13.28,-.25,12.32],
// 4 16 14.4 -.25 -8.8 14.4 0 -8.8 15.84 0 -4 15.84 -.25 -4
  [4,16,14.4,-.25,-8.8,14.4,0,-8.8,15.84,0,-4,15.84,-.25,-4],
// 4 16 12.16 -.25 -12.8 12.16 0 -12.8 14.4 0 -8.8 14.4 -.25 -8.8
  [4,16,12.16,-.25,-12.8,12.16,0,-12.8,14.4,0,-8.8,14.4,-.25,-8.8],
// 4 16 16.32 -.25 0 16.32 0 0 16.32 0 2.88 16.32 -.25 2.88
  [4,16,16.32,-.25,0,16.32,0,0,16.32,0,2.88,16.32,-.25,2.88],
// 4 16 15.84 -.25 -4 15.84 0 -4 16.32 0 0 16.32 -.25 0
  [4,16,15.84,-.25,-4,15.84,0,-4,16.32,0,0,16.32,-.25,0],
// 4 16 .16 -.25 -16.48 .16 0 -16.48 5.6 0 -16 5.6 -.25 -16
  [4,16,.16,-.25,-16.48,.16,0,-16.48,5.6,0,-16,5.6,-.25,-16],
// 4 16 -5.28 -.25 -16 -5.28 0 -16 .16 0 -16.48 .16 -.25 -16.48
  [4,16,-5.28,-.25,-16,-5.28,0,-16,.16,0,-16.48,.16,-.25,-16.48],
// 4 16 8.96 -.25 -14.88 8.96 0 -14.88 12.16 0 -12.8 12.16 -.25 -12.8
  [4,16,8.96,-.25,-14.88,8.96,0,-14.88,12.16,0,-12.8,12.16,-.25,-12.8],
// 4 16 5.6 -.25 -16 5.6 0 -16 8.96 0 -14.88 8.96 -.25 -14.88
  [4,16,5.6,-.25,-16,5.6,0,-16,8.96,0,-14.88,8.96,-.25,-14.88],
// 4 16 -14.08 -.25 -8.8 -14.08 0 -8.8 -11.84 0 -12.8 -11.84 -.25 -12.8
  [4,16,-14.08,-.25,-8.8,-14.08,0,-8.8,-11.84,0,-12.8,-11.84,-.25,-12.8],
// 4 16 -15.52 -.25 -4 -15.52 0 -4 -14.08 0 -8.8 -14.08 -.25 -8.8
  [4,16,-15.52,-.25,-4,-15.52,0,-4,-14.08,0,-8.8,-14.08,-.25,-8.8],
// 4 16 -8.64 -.25 -14.88 -8.64 0 -14.88 -5.28 0 -16 -5.28 -.25 -16
  [4,16,-8.64,-.25,-14.88,-8.64,0,-14.88,-5.28,0,-16,-5.28,-.25,-16],
// 4 16 -11.84 -.25 -12.8 -11.84 0 -12.8 -8.64 0 -14.88 -8.64 -.25 -14.88
  [4,16,-11.84,-.25,-12.8,-11.84,0,-12.8,-8.64,0,-14.88,-8.64,-.25,-14.88],
// 4 16 -15.68 -.25 6.08 -15.68 0 6.08 -16 0 2.88 -16 -.25 2.88
  [4,16,-15.68,-.25,6.08,-15.68,0,6.08,-16,0,2.88,-16,-.25,2.88],
// 4 16 -14.72 -.25 9.76 -14.72 0 9.76 -15.68 0 6.08 -15.68 -.25 6.08
  [4,16,-14.72,-.25,9.76,-14.72,0,9.76,-15.68,0,6.08,-15.68,-.25,6.08],
// 4 16 -16 -.25 0 -16 0 0 -15.52 0 -4 -15.52 -.25 -4
  [4,16,-16,-.25,0,-16,0,0,-15.52,0,-4,-15.52,-.25,-4],
// 4 16 -16 -.25 2.88 -16 0 2.88 -16 0 0 -16 -.25 0
  [4,16,-16,-.25,2.88,-16,0,2.88,-16,0,0,-16,-.25,0],
// 4 16 -6.72 -.25 14.56 -6.72 0 14.56 -10.4 0 14.08 -10.4 -.25 14.08
  [4,16,-6.72,-.25,14.56,-6.72,0,14.56,-10.4,0,14.08,-10.4,-.25,14.08],
// 4 16 -4 -.25 14.56 -4 0 14.56 -6.72 0 14.56 -6.72 -.25 14.56
  [4,16,-4,-.25,14.56,-4,0,14.56,-6.72,0,14.56,-6.72,-.25,14.56],
// 4 16 -12.96 -.25 12.32 -12.96 0 12.32 -14.72 0 9.76 -14.72 -.25 9.76
  [4,16,-12.96,-.25,12.32,-12.96,0,12.32,-14.72,0,9.76,-14.72,-.25,9.76],
// 4 16 -10.4 -.25 14.08 -10.4 0 14.08 -12.96 0 12.32 -12.96 -.25 12.32
  [4,16,-10.4,-.25,14.08,-10.4,0,14.08,-12.96,0,12.32,-12.96,-.25,12.32],
// 4 16 .16 -.25 14.4 .16 0 14.4 -4 0 14.56 -4 -.25 14.56
  [4,16,.16,-.25,14.4,.16,0,14.4,-4,0,14.56,-4,-.25,14.56],
// 4 16 4.32 -.25 14.56 4.32 0 14.56 .16 0 14.4 .16 -.25 14.4
  [4,16,4.32,-.25,14.56,4.32,0,14.56,.16,0,14.4,.16,-.25,14.4],
// 5 24 -14.08 0 -8.8 -14.08 -.25 -8.8 -15.52 0 -4 -11.84 0 -12.8
  [5,24,-14.08,0,-8.8,-14.08,-.25,-8.8,-15.52,0,-4,-11.84,0,-12.8],
// 5 24 -15.52 0 -4 -15.52 -.25 -4 -16 0 0 -14.08 0 -8.8
  [5,24,-15.52,0,-4,-15.52,-.25,-4,-16,0,0,-14.08,0,-8.8],
// 5 24 -8.64 0 -14.88 -8.64 -.25 -14.88 -11.84 0 -12.8 -5.28 0 -16
  [5,24,-8.64,0,-14.88,-8.64,-.25,-14.88,-11.84,0,-12.8,-5.28,0,-16],
// 5 24 -11.84 0 -12.8 -11.84 -.25 -12.8 -14.08 0 -8.8 -8.64 0 -14.88
  [5,24,-11.84,0,-12.8,-11.84,-.25,-12.8,-14.08,0,-8.8,-8.64,0,-14.88],
// 5 24 -15.68 0 6.08 -15.68 -.25 6.08 -14.72 0 9.76 -16 0 2.88
  [5,24,-15.68,0,6.08,-15.68,-.25,6.08,-14.72,0,9.76,-16,0,2.88],
// 5 24 -14.72 0 9.76 -14.72 -.25 9.76 -12.96 0 12.32 -15.68 0 6.08
  [5,24,-14.72,0,9.76,-14.72,-.25,9.76,-12.96,0,12.32,-15.68,0,6.08],
// 5 24 -16 0 0 -16 -.25 0 -16 0 2.88 -15.52 0 -4
  [5,24,-16,0,0,-16,-.25,0,-16,0,2.88,-15.52,0,-4],
// 5 24 -16 0 2.88 -16 -.25 2.88 -15.68 0 6.08 -16 0 0
  [5,24,-16,0,2.88,-16,-.25,2.88,-15.68,0,6.08,-16,0,0],
// 5 24 -6.72 0 14.56 -6.72 -.25 14.56 -4 0 14.56 -10.4 0 14.08
  [5,24,-6.72,0,14.56,-6.72,-.25,14.56,-4,0,14.56,-10.4,0,14.08],
// 5 24 -4 0 14.56 -4 -.25 14.56 .16 0 14.4 -6.72 0 14.56
  [5,24,-4,0,14.56,-4,-.25,14.56,.16,0,14.4,-6.72,0,14.56],
// 5 24 -12.96 0 12.32 -12.96 -.25 12.32 -10.4 0 14.08 -14.72 0 9.76
  [5,24,-12.96,0,12.32,-12.96,-.25,12.32,-10.4,0,14.08,-14.72,0,9.76],
// 5 24 -10.4 0 14.08 -10.4 -.25 14.08 -6.72 0 14.56 -12.96 0 12.32
  [5,24,-10.4,0,14.08,-10.4,-.25,14.08,-6.72,0,14.56,-12.96,0,12.32],
// 5 24 .16 0 14.4 .16 -.25 14.4 4.32 0 14.56 -4 0 14.56
  [5,24,.16,0,14.4,.16,-.25,14.4,4.32,0,14.56,-4,0,14.56],
// 5 24 4.32 0 14.56 4.32 -.25 14.56 .16 0 14.4 7.04 0 14.56
  [5,24,4.32,0,14.56,4.32,-.25,14.56,.16,0,14.4,7.04,0,14.56],
// 5 24 7.04 0 14.56 7.04 -.25 14.56 10.72 0 14.08 4.32 0 14.56
  [5,24,7.04,0,14.56,7.04,-.25,14.56,10.72,0,14.08,4.32,0,14.56],
// 5 24 10.72 0 14.08 10.72 -.25 14.08 13.28 0 12.32 7.04 0 14.56
  [5,24,10.72,0,14.08,10.72,-.25,14.08,13.28,0,12.32,7.04,0,14.56],
// 5 24 16 0 6.08 16 -.25 6.08 16.32 0 2.88 15.04 0 9.76
  [5,24,16,0,6.08,16,-.25,6.08,16.32,0,2.88,15.04,0,9.76],
// 5 24 16.32 0 2.88 16.32 -.25 2.88 16.32 0 0 16 0 6.08
  [5,24,16.32,0,2.88,16.32,-.25,2.88,16.32,0,0,16,0,6.08],
// 5 24 13.28 0 12.32 13.28 -.25 12.32 15.04 0 9.76 10.72 0 14.08
  [5,24,13.28,0,12.32,13.28,-.25,12.32,15.04,0,9.76,10.72,0,14.08],
// 5 24 15.04 0 9.76 15.04 -.25 9.76 16 0 6.08 13.28 0 12.32
  [5,24,15.04,0,9.76,15.04,-.25,9.76,16,0,6.08,13.28,0,12.32],
// 5 24 14.4 0 -8.8 14.4 -.25 -8.8 12.16 0 -12.8 15.84 0 -4
  [5,24,14.4,0,-8.8,14.4,-.25,-8.8,12.16,0,-12.8,15.84,0,-4],
// 5 24 12.16 0 -12.8 12.16 -.25 -12.8 8.96 0 -14.88 14.4 0 -8.8
  [5,24,12.16,0,-12.8,12.16,-.25,-12.8,8.96,0,-14.88,14.4,0,-8.8],
// 5 24 16.32 0 0 16.32 -.25 0 15.84 0 -4 16.32 0 2.88
  [5,24,16.32,0,0,16.32,-.25,0,15.84,0,-4,16.32,0,2.88],
// 5 24 15.84 0 -4 15.84 -.25 -4 14.4 0 -8.8 16.32 0 0
  [5,24,15.84,0,-4,15.84,-.25,-4,14.4,0,-8.8,16.32,0,0],
// 5 24 .16 0 -16.48 .16 -.25 -16.48 -5.28 0 -16 5.6 0 -16
  [5,24,.16,0,-16.48,.16,-.25,-16.48,-5.28,0,-16,5.6,0,-16],
// 5 24 -5.28 0 -16 -5.28 -.25 -16 -8.64 0 -14.88 .16 0 -16.48
  [5,24,-5.28,0,-16,-5.28,-.25,-16,-8.64,0,-14.88,.16,0,-16.48],
// 5 24 8.96 0 -14.88 8.96 -.25 -14.88 5.6 0 -16 12.16 0 -12.8
  [5,24,8.96,0,-14.88,8.96,-.25,-14.88,5.6,0,-16,12.16,0,-12.8],
// 5 24 5.6 0 -16 5.6 -.25 -16 .16 0 -16.48 8.96 0 -14.88
  [5,24,5.6,0,-16,5.6,-.25,-16,.16,0,-16.48,8.96,0,-14.88],
];
makepoly(ldraw_lib__194065e(), line=0.2);
